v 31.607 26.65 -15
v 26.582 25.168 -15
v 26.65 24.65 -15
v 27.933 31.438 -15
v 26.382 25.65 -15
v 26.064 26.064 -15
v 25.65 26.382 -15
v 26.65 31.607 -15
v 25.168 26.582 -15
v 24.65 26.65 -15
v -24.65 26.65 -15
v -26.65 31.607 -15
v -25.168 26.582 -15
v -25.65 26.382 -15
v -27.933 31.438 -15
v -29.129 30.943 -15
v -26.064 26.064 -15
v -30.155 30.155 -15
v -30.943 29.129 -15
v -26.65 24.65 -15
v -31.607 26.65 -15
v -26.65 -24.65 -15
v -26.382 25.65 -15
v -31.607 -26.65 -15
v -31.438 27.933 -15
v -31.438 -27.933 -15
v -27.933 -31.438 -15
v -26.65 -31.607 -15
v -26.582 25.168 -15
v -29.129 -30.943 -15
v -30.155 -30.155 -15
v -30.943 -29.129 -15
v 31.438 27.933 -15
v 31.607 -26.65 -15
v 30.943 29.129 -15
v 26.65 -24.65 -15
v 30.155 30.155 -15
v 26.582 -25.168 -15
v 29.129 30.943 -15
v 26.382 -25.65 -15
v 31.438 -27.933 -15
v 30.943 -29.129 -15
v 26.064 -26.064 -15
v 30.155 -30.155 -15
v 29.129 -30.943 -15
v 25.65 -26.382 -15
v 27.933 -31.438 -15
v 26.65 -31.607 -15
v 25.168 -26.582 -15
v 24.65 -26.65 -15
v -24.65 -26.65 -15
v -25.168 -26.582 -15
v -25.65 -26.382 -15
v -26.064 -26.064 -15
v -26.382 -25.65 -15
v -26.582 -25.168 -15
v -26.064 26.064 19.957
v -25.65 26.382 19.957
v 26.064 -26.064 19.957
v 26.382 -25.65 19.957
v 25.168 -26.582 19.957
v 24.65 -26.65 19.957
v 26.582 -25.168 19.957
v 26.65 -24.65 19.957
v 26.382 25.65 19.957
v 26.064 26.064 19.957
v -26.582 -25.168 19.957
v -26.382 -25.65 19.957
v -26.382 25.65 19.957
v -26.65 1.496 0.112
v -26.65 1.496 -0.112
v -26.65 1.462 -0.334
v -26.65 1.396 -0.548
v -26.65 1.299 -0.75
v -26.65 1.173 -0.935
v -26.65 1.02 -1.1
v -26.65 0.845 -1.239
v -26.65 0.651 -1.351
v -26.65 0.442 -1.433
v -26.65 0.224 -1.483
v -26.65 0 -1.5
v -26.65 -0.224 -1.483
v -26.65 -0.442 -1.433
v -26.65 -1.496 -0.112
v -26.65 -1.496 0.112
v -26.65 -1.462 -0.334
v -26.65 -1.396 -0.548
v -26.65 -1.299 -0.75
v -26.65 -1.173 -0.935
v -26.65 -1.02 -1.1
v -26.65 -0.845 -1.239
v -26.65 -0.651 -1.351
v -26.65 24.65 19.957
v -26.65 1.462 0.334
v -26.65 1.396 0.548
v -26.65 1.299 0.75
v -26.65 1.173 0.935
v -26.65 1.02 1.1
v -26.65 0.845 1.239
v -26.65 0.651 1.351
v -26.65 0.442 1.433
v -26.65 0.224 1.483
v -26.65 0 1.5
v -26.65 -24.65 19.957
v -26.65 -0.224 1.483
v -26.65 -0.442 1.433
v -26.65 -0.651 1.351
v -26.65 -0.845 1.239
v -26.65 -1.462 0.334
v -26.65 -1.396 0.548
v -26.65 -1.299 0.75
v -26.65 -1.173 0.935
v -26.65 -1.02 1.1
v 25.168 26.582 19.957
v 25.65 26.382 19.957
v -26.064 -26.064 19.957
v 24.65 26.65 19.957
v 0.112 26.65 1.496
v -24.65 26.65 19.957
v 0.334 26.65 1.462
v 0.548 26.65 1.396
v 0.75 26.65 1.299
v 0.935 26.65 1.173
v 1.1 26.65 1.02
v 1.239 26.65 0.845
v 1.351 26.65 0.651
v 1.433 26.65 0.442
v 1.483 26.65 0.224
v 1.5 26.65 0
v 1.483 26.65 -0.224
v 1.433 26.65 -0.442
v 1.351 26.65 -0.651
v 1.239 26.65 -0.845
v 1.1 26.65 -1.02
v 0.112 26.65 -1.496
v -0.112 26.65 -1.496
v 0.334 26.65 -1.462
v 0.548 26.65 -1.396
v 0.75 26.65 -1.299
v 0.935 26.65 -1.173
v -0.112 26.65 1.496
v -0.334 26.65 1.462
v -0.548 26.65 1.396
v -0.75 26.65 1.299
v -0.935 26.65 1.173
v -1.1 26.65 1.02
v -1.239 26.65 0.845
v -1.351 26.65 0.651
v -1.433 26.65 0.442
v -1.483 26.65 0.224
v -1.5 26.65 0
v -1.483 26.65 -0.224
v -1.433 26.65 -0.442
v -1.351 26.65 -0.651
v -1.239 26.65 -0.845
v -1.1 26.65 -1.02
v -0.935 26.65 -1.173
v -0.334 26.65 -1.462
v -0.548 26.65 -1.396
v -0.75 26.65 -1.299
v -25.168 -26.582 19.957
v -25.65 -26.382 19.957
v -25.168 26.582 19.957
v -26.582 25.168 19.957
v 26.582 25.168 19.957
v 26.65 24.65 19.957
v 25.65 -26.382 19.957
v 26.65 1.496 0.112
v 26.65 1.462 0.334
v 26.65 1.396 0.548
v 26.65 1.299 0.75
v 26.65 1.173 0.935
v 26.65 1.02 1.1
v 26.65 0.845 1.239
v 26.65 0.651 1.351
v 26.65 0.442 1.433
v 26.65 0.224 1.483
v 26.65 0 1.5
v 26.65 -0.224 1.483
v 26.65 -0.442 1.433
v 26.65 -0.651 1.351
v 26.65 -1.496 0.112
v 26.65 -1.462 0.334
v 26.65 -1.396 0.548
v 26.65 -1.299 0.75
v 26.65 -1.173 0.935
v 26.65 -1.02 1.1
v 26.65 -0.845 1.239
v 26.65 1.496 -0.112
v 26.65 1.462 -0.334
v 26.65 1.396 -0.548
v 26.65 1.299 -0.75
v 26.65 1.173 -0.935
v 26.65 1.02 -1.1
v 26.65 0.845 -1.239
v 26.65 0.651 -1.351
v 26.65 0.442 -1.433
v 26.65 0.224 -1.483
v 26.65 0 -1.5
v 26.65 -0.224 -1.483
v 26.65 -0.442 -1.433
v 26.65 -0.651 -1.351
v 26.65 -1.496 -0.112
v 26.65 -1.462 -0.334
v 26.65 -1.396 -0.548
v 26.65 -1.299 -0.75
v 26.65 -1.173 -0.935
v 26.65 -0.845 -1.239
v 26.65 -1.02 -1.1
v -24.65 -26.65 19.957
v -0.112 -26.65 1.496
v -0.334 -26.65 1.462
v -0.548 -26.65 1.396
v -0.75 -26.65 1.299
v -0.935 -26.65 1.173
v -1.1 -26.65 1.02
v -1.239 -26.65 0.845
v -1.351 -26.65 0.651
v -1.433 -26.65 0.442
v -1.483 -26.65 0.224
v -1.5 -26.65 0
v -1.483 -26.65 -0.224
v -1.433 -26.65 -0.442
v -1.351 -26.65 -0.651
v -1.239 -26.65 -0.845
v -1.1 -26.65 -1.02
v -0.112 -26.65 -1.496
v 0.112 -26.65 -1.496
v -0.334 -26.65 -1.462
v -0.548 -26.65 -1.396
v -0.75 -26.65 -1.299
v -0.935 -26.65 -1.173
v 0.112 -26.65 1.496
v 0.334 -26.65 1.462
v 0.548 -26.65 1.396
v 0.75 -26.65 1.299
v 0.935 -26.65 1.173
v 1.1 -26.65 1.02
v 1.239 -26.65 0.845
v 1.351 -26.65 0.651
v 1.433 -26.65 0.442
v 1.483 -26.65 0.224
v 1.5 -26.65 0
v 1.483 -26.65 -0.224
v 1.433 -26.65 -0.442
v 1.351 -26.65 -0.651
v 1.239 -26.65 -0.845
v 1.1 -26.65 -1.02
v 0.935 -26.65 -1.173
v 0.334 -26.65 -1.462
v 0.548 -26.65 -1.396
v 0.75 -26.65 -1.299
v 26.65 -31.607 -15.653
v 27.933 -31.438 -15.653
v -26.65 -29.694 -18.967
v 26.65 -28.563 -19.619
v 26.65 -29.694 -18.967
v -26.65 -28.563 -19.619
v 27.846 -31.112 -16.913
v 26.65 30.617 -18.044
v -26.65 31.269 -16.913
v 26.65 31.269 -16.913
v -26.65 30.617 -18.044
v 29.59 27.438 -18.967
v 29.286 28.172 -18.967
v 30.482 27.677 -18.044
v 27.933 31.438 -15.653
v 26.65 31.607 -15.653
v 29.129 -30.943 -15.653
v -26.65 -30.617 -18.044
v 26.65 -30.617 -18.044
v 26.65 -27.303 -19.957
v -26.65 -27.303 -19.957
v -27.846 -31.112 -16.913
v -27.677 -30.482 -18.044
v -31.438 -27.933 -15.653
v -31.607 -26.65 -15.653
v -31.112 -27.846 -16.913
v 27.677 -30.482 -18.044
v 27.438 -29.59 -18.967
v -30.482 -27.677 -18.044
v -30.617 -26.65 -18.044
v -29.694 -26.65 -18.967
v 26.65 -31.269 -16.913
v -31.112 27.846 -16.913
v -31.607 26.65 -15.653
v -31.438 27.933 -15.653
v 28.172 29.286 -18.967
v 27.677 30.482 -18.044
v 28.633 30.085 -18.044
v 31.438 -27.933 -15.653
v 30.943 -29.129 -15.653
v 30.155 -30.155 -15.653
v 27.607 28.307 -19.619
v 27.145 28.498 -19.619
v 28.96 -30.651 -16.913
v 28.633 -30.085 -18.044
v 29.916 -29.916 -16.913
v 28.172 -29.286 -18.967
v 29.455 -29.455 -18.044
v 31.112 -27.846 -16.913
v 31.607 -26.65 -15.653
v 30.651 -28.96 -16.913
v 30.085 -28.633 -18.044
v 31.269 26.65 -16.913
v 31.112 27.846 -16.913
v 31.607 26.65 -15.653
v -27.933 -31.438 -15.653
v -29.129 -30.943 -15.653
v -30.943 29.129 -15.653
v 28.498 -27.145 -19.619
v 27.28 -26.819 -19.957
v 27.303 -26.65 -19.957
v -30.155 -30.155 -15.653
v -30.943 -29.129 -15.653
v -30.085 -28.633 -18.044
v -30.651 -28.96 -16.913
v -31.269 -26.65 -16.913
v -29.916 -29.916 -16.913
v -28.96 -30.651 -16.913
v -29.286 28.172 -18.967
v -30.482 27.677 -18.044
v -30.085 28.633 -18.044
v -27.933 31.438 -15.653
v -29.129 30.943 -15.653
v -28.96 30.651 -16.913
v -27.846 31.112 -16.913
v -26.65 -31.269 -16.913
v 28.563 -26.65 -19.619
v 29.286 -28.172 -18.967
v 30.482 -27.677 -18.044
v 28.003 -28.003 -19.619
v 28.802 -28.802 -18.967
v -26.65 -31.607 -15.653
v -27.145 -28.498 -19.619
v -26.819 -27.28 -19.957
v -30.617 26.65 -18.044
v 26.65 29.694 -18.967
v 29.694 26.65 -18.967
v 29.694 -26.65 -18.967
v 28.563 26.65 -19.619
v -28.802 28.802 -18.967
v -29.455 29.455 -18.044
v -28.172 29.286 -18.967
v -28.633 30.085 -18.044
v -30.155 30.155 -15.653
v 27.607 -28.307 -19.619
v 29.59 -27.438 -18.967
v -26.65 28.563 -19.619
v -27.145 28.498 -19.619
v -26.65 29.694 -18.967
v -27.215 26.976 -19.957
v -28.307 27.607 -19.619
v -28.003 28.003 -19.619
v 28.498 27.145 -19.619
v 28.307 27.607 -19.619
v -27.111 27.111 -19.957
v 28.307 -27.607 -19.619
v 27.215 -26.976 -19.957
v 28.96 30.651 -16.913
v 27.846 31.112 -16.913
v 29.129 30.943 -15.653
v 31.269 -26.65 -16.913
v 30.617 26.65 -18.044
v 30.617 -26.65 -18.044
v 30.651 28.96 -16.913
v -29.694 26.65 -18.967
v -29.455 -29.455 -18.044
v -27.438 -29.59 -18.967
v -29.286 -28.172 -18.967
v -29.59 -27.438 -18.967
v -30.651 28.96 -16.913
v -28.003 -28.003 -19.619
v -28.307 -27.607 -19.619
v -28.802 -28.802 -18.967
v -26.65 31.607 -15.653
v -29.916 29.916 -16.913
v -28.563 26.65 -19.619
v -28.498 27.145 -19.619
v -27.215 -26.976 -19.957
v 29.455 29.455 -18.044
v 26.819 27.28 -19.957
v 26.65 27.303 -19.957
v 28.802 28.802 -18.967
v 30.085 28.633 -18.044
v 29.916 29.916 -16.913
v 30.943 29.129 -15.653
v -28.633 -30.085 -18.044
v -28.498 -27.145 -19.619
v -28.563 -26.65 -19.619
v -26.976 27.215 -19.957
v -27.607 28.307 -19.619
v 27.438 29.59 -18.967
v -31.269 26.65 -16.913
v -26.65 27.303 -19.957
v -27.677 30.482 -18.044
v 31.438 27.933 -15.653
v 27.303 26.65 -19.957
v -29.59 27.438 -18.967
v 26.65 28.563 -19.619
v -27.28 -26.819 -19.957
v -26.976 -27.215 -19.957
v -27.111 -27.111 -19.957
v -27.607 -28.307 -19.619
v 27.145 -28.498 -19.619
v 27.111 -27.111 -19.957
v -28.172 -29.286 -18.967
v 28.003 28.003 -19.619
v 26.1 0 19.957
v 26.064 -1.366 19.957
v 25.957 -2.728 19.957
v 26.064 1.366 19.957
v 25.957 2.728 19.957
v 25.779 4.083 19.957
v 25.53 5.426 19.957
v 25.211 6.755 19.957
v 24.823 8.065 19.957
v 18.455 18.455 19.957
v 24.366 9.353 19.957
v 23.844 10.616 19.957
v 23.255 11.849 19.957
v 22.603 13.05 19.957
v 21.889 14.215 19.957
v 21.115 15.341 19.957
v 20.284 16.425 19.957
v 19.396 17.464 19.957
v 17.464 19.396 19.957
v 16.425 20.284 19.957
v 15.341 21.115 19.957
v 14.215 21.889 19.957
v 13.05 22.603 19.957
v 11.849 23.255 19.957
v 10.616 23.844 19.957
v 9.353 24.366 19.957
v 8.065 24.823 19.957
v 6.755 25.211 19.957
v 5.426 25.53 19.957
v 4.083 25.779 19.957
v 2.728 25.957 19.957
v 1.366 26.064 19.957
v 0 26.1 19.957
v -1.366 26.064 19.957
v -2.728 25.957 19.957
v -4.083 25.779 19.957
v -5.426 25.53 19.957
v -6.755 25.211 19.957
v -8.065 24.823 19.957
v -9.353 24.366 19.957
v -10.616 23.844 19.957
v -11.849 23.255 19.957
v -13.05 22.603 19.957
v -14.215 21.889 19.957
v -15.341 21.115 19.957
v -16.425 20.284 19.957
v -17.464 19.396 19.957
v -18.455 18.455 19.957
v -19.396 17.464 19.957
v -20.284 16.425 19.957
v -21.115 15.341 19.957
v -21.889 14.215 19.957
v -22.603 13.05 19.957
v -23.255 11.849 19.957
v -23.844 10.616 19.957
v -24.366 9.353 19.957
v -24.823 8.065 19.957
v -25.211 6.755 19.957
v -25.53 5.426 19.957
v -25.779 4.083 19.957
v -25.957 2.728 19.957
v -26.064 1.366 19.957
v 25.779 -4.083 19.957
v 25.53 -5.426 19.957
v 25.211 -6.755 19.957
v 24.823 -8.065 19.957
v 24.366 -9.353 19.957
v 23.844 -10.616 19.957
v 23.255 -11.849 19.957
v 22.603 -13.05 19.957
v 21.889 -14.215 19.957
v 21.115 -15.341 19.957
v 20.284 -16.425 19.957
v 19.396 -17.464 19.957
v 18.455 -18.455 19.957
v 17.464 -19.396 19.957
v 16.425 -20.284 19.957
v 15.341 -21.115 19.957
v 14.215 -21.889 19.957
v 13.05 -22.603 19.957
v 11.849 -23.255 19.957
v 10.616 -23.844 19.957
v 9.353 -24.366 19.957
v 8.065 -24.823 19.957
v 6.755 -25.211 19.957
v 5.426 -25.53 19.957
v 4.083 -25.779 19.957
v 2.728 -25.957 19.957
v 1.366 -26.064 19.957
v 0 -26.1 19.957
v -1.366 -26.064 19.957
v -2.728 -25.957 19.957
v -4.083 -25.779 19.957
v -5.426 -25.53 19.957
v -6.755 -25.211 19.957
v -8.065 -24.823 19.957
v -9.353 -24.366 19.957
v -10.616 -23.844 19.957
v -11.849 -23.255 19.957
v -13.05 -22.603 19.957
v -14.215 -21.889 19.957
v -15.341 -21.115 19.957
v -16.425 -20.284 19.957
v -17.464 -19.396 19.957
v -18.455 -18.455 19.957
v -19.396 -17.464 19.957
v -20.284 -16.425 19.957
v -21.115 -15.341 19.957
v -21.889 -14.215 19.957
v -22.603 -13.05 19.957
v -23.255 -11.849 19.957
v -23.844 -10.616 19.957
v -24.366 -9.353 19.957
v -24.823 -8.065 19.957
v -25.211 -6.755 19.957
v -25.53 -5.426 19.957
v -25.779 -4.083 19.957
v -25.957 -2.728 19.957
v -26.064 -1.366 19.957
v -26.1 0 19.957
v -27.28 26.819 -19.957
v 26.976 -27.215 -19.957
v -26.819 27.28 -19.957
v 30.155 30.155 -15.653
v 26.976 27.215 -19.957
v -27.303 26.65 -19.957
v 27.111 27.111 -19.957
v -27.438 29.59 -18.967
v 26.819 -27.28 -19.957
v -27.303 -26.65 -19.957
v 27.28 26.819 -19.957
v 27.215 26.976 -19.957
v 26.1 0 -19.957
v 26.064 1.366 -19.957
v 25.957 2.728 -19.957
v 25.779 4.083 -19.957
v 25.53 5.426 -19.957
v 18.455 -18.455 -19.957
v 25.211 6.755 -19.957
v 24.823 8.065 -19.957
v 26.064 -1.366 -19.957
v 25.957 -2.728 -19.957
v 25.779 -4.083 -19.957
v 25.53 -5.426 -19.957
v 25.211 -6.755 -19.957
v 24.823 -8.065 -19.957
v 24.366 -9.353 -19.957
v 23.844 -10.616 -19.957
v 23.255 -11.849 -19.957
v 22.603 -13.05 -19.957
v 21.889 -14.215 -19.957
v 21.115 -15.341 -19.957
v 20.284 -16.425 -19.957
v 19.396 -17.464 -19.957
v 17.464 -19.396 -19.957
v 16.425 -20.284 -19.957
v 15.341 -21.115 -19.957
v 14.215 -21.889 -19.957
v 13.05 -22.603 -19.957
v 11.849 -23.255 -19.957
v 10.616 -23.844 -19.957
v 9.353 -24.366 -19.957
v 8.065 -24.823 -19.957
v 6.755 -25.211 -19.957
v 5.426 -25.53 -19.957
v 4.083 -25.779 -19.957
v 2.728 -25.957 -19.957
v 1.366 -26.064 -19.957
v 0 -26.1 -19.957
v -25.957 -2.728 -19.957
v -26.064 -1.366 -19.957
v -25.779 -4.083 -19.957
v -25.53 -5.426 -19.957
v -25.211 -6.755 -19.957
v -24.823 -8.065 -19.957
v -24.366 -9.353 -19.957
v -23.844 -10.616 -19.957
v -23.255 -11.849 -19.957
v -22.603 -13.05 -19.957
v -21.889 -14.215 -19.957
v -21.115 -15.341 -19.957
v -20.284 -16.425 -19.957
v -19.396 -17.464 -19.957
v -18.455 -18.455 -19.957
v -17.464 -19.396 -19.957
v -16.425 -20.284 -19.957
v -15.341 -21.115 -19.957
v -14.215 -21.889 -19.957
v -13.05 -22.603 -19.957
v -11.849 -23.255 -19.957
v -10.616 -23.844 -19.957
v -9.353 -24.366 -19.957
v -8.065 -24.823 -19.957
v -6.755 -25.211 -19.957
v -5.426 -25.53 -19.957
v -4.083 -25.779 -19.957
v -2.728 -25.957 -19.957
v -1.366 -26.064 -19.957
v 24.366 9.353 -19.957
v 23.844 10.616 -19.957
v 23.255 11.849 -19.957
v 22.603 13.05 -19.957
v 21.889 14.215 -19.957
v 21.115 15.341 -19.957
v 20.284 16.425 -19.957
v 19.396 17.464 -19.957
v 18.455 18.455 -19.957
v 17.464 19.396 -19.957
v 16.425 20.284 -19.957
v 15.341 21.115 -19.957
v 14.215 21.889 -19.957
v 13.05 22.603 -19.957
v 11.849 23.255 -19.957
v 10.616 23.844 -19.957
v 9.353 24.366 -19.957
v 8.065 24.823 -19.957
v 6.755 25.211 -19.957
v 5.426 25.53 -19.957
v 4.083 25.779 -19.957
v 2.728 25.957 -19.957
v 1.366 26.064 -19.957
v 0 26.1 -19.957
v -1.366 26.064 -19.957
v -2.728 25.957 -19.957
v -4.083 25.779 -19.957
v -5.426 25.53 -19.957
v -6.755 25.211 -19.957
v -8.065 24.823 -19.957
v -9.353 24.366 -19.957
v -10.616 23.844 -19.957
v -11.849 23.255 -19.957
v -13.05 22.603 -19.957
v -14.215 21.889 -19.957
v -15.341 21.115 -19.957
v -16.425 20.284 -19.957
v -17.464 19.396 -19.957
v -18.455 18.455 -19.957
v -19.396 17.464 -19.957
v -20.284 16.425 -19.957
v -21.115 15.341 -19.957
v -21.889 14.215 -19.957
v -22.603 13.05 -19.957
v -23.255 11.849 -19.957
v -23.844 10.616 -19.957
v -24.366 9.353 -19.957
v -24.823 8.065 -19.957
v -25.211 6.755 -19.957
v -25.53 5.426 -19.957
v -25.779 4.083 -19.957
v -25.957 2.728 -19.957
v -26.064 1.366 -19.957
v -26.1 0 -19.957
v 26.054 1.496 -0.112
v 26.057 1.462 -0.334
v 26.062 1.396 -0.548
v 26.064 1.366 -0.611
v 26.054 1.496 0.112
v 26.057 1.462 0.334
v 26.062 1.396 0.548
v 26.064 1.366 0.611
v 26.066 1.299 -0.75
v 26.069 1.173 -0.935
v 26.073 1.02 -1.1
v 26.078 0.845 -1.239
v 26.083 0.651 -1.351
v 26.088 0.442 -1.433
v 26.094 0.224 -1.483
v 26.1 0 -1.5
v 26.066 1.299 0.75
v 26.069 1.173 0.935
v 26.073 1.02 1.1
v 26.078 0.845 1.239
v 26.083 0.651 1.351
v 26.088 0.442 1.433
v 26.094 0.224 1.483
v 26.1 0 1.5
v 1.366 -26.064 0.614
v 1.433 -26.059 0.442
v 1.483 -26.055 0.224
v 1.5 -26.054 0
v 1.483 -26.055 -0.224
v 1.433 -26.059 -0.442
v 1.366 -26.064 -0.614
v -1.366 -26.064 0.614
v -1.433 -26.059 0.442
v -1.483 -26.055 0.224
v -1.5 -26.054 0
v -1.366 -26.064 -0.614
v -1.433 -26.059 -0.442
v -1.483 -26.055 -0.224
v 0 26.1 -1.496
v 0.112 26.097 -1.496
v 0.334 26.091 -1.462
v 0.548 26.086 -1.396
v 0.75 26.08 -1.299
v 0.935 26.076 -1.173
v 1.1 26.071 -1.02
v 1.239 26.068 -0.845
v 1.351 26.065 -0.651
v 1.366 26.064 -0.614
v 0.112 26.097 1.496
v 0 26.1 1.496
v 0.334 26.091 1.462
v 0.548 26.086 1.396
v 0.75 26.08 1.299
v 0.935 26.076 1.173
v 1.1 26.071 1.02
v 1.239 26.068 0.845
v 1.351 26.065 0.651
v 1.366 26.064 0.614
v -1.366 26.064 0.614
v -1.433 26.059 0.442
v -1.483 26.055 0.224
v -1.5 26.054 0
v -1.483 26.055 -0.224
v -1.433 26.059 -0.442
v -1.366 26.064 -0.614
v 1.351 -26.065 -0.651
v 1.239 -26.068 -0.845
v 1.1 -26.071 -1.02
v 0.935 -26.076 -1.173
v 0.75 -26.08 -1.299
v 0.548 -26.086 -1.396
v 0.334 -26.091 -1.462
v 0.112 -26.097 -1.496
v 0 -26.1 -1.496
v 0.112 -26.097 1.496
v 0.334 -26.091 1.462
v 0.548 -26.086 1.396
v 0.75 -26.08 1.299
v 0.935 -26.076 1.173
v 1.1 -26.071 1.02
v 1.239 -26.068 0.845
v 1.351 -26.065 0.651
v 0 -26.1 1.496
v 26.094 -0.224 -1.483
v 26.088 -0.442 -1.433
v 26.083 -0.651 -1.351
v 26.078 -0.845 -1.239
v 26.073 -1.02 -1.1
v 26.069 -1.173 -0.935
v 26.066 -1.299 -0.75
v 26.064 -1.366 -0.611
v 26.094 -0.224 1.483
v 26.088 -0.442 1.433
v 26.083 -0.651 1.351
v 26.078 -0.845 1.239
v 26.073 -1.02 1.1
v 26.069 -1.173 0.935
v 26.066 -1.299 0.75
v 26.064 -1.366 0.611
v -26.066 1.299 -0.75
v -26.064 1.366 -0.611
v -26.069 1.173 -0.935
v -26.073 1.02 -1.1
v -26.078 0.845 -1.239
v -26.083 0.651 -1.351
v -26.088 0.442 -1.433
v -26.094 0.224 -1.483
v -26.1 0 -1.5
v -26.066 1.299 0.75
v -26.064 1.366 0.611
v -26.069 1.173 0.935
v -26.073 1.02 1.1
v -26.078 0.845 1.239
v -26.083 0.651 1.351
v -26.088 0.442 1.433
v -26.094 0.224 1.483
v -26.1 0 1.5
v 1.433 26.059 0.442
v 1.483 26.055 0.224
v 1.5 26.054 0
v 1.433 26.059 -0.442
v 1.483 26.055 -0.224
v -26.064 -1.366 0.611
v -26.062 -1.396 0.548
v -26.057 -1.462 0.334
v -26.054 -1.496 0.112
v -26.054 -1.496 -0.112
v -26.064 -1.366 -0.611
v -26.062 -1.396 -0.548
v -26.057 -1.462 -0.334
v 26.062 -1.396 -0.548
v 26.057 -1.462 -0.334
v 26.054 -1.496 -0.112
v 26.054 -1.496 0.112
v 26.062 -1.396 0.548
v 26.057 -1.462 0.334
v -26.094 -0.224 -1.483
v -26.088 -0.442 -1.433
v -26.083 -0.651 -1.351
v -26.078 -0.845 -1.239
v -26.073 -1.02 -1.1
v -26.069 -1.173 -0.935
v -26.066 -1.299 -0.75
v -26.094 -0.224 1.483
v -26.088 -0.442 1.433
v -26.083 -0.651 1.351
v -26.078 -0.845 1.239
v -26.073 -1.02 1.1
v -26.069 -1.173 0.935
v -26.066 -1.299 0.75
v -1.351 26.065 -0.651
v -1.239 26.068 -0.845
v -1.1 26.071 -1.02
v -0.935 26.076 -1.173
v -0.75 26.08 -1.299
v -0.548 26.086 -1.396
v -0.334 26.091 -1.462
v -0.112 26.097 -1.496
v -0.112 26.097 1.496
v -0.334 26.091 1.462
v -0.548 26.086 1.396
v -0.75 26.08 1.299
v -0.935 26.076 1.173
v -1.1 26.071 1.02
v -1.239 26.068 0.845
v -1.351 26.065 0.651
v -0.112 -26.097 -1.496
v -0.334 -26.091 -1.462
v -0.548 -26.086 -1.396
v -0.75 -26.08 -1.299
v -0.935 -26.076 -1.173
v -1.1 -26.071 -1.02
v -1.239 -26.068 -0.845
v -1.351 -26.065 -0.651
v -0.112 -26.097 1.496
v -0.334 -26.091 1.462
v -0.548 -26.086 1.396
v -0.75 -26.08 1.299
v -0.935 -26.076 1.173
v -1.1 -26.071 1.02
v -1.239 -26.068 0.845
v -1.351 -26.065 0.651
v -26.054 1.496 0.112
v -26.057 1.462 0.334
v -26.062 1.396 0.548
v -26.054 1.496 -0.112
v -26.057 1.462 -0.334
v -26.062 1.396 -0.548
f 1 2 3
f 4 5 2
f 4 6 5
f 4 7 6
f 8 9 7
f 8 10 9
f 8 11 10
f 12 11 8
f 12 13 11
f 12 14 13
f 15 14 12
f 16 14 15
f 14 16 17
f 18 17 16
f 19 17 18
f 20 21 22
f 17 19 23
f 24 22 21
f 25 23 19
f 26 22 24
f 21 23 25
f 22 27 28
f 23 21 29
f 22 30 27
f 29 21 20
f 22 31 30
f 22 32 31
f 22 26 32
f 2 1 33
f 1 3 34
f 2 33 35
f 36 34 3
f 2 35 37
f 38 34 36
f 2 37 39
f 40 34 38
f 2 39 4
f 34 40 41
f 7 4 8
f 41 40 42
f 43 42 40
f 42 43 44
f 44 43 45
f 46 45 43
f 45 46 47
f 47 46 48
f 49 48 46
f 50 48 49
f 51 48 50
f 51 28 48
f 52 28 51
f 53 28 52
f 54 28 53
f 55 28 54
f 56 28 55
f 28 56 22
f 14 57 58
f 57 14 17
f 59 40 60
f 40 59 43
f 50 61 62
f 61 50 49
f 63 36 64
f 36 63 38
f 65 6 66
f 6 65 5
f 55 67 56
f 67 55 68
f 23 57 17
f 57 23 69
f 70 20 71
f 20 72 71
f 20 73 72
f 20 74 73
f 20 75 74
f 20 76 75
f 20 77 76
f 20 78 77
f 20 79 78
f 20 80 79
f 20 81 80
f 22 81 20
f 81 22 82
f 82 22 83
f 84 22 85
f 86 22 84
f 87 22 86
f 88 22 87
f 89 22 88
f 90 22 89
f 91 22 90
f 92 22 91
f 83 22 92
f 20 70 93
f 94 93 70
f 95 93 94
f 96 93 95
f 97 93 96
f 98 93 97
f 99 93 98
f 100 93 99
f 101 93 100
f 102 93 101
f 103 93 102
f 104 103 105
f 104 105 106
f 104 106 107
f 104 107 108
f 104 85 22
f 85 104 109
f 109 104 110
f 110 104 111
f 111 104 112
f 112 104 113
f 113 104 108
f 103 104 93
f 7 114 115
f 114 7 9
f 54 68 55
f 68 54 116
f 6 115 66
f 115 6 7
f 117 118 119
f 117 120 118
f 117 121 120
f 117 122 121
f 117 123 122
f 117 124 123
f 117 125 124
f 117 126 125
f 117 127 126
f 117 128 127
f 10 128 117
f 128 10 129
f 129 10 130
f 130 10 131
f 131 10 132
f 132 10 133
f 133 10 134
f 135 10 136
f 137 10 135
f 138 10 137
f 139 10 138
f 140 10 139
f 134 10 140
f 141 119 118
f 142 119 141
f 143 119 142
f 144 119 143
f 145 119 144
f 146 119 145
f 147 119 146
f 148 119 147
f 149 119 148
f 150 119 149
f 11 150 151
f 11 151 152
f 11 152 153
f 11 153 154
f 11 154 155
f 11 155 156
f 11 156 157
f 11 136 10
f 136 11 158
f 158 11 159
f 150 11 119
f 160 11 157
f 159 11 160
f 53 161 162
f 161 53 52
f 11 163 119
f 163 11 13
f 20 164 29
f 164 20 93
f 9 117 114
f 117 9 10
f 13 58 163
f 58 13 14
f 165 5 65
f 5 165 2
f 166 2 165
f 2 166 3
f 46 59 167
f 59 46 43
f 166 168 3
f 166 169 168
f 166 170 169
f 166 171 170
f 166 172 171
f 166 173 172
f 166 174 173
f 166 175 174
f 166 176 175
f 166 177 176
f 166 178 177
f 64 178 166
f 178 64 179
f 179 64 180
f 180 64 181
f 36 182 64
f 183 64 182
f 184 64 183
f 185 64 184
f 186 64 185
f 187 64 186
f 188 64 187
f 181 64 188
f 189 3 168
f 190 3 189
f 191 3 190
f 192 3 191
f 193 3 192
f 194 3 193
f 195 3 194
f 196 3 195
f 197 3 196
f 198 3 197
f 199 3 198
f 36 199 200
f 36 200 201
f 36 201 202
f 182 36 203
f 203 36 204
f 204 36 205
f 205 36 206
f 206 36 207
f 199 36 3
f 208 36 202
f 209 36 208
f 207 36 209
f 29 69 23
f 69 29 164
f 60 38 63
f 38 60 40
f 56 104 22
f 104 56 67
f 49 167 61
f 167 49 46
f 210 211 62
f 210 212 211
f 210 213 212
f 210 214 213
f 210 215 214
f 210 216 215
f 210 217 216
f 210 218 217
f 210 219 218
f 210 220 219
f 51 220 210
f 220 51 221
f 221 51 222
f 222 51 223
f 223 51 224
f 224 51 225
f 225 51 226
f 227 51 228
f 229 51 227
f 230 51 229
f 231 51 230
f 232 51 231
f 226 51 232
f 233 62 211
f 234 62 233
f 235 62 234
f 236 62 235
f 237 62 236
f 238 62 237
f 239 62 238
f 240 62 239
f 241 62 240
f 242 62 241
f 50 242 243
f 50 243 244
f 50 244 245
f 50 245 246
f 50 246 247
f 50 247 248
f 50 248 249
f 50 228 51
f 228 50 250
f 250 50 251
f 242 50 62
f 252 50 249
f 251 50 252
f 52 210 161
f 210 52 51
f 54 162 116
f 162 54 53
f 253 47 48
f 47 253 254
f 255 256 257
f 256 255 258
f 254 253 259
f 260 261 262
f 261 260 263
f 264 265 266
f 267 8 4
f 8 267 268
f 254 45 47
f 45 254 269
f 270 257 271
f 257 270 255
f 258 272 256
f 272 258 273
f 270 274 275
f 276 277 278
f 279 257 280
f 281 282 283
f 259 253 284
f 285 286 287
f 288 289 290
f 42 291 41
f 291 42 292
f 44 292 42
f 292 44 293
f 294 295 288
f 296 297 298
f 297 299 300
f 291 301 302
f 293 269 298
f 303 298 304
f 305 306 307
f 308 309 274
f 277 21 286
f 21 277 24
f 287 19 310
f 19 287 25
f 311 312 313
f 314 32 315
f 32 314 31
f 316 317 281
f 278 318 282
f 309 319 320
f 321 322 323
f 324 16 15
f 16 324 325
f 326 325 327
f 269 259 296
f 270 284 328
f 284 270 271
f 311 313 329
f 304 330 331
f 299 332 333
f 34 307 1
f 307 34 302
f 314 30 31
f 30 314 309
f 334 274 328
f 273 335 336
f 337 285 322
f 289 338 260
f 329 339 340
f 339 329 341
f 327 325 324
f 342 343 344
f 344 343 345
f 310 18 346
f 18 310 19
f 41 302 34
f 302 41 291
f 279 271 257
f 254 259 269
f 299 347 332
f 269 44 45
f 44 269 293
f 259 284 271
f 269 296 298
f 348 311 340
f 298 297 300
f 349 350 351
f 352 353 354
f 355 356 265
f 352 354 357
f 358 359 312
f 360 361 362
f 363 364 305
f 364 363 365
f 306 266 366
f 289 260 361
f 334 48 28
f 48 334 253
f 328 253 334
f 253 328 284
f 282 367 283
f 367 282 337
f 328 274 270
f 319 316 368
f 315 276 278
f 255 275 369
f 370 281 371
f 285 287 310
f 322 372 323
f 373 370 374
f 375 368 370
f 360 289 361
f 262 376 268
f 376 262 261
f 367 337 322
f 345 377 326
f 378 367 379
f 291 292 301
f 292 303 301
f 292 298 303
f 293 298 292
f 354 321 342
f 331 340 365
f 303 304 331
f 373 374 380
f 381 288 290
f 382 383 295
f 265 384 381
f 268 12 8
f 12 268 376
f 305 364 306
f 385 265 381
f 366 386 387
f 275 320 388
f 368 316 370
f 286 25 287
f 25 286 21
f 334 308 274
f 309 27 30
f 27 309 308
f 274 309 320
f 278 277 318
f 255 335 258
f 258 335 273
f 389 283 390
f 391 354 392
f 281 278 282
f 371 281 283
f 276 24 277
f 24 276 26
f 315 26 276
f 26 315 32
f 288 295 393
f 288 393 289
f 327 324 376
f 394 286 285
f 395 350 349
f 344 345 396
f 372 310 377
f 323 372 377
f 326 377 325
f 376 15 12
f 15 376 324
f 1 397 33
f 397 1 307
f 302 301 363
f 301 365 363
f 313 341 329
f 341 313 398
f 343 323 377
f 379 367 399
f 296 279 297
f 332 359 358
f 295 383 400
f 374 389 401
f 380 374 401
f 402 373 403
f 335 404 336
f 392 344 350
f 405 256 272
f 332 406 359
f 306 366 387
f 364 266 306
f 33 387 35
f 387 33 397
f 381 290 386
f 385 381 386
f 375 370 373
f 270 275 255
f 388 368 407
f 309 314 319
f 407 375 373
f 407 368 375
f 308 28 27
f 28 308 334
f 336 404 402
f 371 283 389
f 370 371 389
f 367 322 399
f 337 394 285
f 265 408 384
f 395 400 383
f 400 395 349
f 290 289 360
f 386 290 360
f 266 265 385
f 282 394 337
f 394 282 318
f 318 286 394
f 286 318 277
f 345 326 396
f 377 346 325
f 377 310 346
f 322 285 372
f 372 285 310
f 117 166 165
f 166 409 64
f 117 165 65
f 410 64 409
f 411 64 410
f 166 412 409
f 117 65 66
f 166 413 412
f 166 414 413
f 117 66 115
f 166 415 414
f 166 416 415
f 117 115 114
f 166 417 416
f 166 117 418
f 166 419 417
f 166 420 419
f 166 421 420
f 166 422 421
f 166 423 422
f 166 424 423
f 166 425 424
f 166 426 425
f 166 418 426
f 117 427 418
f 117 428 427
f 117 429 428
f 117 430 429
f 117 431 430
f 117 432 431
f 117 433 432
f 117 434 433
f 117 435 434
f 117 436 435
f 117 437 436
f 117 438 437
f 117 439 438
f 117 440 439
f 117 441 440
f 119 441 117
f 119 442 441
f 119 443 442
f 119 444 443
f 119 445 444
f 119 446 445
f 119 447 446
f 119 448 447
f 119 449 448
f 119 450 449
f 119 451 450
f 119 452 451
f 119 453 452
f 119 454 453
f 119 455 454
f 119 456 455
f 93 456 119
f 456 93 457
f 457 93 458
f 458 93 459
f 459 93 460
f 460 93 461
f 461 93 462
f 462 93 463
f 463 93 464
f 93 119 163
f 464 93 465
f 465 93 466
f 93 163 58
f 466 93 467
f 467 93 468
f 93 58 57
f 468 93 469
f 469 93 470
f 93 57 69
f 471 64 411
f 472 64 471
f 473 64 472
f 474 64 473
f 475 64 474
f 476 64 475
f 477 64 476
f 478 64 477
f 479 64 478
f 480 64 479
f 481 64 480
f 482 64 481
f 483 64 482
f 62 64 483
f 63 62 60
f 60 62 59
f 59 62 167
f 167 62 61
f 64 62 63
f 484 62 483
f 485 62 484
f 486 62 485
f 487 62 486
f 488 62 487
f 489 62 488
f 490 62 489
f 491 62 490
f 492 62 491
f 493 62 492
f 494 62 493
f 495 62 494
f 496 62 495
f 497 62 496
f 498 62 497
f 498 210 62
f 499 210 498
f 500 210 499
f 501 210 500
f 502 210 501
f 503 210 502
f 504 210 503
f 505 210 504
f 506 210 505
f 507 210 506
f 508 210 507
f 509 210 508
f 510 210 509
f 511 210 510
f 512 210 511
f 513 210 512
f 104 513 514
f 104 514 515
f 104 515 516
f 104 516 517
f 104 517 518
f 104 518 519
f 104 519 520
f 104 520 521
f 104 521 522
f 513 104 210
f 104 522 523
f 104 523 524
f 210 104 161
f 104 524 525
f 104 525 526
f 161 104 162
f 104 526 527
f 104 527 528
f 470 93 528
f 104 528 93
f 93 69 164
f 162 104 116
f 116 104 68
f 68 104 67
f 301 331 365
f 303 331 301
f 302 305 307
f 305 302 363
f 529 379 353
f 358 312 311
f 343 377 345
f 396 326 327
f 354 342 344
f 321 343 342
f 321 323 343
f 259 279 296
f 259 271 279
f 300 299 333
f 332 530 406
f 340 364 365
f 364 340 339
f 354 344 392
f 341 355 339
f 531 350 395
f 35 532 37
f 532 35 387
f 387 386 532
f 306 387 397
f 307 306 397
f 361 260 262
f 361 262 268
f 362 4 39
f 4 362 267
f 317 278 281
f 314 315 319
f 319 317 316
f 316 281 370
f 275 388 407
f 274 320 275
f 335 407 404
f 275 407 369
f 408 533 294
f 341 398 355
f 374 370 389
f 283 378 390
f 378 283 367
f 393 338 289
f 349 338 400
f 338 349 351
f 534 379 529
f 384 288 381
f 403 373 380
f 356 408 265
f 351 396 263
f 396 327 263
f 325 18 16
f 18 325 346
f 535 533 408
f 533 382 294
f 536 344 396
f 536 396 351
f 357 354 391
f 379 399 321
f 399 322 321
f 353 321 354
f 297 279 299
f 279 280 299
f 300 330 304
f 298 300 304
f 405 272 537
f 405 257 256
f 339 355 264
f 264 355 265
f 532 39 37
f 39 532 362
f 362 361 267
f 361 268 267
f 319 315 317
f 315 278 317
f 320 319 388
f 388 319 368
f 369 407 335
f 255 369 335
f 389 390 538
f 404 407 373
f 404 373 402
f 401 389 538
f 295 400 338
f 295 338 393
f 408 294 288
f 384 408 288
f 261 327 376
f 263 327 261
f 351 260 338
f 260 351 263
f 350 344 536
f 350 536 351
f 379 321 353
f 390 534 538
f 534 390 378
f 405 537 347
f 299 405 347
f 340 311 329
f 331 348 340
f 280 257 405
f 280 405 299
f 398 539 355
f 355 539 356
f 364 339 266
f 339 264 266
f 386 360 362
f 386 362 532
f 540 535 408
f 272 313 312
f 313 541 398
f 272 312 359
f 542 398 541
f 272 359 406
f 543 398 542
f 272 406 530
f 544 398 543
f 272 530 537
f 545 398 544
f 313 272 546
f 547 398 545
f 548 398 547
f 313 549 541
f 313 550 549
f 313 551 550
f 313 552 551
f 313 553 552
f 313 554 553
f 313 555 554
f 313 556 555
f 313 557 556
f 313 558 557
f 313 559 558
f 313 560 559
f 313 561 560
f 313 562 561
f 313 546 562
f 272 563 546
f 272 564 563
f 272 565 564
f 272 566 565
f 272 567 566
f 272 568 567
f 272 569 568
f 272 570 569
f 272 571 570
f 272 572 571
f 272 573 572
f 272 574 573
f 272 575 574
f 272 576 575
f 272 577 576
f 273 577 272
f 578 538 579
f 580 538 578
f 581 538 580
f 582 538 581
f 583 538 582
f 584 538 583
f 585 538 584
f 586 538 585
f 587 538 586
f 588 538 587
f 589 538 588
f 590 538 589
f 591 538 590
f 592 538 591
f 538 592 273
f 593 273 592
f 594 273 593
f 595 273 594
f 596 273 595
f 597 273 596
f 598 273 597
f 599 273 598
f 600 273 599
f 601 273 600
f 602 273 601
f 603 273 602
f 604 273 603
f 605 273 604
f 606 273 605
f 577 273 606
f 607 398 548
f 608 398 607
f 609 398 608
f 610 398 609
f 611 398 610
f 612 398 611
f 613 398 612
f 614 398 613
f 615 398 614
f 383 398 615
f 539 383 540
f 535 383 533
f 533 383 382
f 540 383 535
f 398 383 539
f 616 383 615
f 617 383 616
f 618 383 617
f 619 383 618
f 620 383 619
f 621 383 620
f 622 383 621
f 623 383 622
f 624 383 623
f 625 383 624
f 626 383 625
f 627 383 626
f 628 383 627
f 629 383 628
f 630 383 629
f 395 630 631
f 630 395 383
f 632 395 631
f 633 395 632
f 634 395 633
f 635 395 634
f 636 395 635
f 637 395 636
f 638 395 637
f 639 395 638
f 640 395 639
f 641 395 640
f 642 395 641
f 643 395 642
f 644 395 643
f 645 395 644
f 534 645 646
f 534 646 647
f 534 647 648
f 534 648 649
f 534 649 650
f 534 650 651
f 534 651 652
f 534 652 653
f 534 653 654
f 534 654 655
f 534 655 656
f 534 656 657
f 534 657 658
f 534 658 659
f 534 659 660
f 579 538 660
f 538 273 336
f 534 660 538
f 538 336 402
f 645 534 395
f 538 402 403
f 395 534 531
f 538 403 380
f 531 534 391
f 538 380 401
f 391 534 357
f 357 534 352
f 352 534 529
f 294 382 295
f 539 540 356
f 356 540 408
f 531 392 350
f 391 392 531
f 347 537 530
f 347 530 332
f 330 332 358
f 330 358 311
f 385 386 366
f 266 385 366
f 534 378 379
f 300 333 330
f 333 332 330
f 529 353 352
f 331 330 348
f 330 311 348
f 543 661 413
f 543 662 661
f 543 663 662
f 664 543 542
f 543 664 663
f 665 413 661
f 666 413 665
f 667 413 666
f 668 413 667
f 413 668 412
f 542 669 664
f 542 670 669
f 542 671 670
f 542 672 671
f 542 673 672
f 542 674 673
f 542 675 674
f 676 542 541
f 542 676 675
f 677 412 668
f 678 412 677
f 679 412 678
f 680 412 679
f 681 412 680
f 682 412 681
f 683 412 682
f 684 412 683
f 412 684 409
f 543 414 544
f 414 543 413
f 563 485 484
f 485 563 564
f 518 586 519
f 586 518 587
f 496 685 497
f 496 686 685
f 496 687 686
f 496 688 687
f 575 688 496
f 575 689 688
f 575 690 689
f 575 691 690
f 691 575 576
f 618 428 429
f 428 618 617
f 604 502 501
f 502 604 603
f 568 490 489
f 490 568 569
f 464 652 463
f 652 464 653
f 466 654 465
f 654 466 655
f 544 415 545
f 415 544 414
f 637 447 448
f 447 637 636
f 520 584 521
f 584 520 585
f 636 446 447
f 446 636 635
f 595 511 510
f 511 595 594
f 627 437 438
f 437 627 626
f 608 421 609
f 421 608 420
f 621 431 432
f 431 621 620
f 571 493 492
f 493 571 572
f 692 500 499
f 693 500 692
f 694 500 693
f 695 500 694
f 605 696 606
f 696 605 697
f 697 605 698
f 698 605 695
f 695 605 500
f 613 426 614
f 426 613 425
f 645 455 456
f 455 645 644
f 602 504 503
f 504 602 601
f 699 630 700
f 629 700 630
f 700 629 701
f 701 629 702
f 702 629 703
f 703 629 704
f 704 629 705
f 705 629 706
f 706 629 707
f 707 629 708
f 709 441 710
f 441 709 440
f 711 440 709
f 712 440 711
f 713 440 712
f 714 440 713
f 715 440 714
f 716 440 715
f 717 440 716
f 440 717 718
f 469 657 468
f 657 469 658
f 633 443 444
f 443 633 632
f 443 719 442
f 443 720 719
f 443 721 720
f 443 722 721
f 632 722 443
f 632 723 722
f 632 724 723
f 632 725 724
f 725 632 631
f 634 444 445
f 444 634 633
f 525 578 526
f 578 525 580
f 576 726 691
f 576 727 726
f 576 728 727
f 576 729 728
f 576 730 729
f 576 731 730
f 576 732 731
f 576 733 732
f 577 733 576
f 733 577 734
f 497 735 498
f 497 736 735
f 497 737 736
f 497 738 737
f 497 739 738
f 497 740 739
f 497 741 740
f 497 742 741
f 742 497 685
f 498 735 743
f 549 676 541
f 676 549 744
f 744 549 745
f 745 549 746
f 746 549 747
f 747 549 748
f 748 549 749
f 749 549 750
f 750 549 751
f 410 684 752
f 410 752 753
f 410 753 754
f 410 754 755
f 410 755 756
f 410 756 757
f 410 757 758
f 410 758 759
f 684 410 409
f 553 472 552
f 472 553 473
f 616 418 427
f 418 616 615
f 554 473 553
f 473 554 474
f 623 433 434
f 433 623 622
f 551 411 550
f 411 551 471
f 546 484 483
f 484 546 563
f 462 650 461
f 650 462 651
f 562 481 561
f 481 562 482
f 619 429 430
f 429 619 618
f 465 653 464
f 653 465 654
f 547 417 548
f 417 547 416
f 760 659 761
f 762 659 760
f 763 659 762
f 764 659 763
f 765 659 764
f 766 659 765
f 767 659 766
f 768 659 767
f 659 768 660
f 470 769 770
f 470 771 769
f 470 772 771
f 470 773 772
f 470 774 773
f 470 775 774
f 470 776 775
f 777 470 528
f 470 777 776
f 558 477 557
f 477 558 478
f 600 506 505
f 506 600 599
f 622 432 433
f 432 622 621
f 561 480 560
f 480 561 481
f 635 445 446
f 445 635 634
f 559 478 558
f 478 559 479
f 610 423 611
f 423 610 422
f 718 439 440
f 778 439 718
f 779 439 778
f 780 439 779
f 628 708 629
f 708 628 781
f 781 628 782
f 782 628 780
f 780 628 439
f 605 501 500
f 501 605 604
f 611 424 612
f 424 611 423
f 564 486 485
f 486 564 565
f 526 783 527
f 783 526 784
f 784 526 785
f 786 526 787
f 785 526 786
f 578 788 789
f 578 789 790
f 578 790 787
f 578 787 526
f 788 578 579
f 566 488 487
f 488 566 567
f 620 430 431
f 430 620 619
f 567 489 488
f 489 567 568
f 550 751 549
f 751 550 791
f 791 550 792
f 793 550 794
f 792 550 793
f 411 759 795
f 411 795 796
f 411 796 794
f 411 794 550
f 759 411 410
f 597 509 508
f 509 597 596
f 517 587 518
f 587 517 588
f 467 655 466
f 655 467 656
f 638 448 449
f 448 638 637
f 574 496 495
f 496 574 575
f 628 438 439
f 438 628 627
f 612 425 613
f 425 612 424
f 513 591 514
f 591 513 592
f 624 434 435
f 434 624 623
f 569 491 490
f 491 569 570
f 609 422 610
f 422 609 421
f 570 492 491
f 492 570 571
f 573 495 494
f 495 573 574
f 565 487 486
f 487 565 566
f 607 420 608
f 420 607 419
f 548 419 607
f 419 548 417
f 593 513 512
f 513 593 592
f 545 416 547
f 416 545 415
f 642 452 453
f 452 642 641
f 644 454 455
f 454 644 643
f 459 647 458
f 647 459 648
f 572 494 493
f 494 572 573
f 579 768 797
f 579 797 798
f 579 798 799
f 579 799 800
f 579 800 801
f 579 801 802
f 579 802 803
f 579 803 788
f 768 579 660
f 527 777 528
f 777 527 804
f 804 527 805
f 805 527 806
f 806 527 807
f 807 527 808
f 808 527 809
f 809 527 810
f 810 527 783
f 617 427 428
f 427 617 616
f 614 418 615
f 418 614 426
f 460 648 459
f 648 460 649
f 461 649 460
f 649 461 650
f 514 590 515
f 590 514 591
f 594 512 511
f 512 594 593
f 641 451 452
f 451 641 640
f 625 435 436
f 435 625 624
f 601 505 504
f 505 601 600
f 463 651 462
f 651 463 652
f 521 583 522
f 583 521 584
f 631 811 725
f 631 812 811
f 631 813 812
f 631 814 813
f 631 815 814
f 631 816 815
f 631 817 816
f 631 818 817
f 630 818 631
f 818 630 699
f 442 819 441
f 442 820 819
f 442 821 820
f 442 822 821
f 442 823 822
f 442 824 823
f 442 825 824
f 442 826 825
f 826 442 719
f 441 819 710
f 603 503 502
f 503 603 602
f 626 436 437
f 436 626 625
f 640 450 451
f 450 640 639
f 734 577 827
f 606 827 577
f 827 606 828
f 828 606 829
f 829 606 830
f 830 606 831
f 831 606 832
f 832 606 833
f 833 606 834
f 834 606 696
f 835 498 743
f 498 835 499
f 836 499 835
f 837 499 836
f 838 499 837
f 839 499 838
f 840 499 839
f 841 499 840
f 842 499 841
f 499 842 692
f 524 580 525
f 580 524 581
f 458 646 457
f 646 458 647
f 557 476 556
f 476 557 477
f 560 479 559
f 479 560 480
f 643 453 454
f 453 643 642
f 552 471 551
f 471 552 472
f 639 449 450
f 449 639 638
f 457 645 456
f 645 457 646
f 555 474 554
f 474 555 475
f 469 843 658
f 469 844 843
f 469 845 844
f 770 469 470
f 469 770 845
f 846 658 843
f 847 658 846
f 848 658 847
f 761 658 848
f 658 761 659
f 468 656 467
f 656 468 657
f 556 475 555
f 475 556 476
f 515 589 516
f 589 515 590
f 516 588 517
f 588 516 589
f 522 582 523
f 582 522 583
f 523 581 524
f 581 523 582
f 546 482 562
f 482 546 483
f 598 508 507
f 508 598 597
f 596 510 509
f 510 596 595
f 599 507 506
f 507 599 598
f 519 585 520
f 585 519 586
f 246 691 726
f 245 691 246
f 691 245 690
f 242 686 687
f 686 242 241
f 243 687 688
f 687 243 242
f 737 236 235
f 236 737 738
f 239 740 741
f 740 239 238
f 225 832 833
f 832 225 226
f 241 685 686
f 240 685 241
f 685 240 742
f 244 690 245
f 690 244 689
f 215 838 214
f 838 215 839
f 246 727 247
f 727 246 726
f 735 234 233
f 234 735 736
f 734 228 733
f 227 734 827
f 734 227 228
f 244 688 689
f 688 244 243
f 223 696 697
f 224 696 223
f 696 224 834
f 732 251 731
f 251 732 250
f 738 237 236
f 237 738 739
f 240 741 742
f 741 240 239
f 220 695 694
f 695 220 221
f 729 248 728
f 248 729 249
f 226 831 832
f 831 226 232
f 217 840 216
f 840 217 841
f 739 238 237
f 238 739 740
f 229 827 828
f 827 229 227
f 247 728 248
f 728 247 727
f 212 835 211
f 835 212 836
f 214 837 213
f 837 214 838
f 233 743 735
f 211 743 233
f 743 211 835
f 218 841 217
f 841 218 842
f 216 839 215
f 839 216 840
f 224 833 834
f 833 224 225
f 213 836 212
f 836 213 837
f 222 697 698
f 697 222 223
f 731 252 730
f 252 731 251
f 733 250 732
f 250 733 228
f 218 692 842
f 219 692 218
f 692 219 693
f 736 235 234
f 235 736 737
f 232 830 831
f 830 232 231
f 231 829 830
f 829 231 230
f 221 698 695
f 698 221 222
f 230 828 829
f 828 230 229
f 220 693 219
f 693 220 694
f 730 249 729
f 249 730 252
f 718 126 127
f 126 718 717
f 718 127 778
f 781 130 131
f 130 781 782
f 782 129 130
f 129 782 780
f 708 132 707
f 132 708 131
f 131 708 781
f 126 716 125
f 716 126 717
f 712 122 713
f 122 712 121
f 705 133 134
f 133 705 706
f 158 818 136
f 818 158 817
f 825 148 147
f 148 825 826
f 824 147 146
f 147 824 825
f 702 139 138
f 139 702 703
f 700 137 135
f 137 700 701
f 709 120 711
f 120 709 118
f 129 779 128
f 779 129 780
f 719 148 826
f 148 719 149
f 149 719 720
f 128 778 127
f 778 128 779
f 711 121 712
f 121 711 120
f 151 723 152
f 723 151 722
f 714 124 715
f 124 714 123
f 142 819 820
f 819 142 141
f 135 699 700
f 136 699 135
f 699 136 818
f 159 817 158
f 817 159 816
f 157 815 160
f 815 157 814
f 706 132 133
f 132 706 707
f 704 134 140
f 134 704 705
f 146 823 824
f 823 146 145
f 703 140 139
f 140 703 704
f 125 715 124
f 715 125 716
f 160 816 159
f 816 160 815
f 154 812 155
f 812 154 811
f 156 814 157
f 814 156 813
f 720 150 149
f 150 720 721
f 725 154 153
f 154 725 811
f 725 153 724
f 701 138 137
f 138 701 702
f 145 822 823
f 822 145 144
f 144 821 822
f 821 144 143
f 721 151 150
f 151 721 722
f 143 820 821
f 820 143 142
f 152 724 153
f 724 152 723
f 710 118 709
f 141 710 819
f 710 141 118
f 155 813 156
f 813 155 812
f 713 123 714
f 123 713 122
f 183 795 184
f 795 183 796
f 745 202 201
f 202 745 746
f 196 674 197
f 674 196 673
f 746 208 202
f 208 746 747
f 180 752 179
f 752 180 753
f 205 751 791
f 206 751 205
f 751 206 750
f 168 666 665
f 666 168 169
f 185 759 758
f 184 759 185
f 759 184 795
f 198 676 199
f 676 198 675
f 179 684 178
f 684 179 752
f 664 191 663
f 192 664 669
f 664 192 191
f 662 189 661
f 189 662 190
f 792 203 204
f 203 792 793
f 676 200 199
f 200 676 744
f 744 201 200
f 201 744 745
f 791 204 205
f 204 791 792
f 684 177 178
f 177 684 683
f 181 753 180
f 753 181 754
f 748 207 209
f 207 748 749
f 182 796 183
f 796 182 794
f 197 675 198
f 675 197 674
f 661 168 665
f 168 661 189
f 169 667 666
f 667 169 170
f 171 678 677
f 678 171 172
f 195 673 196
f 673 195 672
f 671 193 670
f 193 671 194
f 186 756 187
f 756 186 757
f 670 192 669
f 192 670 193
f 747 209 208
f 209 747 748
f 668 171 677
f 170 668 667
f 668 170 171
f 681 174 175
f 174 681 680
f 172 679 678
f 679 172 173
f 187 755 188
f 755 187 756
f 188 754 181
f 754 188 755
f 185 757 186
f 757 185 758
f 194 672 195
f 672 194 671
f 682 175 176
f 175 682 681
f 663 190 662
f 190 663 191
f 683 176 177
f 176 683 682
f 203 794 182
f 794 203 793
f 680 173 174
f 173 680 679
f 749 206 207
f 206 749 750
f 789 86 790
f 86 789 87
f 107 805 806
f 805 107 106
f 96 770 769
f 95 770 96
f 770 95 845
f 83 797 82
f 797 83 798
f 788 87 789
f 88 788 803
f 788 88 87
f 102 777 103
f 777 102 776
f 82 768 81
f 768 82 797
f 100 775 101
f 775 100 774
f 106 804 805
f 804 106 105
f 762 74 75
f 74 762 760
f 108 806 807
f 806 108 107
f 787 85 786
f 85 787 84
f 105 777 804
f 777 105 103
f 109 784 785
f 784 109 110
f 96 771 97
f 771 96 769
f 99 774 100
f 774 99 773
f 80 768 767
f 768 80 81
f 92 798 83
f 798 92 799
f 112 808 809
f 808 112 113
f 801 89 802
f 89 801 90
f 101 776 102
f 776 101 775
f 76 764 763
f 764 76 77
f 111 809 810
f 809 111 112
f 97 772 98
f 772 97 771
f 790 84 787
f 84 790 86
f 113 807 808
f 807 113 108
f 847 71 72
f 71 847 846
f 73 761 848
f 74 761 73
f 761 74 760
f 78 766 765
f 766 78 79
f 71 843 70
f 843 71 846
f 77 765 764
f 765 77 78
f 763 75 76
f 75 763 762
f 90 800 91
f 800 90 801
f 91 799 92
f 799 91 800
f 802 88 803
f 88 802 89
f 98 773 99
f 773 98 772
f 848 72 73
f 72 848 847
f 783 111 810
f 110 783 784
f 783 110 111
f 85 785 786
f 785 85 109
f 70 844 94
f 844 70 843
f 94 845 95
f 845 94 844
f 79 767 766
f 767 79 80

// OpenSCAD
// file: clamp.scad
// Generic clamp for the projector stand

// Copyright (C) 2020 Jeremy Bennett <jeremy@jeremybennett.com>

// Contributor Jeremy Bennett <jeremy@jeremybennett.com>

// SPDX-License-Identifier: CC-BY-SA-4.0

// This fits inside the square to ensure a snug fit on the alumnium tube. This
// is the generic design, with variants for the upper and lower clamp.

// Useful constants
EPS = 0.1;			// Small distance
TUBE_R = 52.2 / 2.0;		// Radius of alumninium tube measured 51.6
SQUARE_L = 53.3;		// Dimensions of the square
SQUARE_W = 53.3;
SQUARE_H = 30.0;
OUTER_ROUND_R = 5.0;		// Curvature of outer edge
INNER_ROUND_R = 2.0;		// Curvature of inner corners
BOLT_OFF = SQUARE_W / 2.0 - 10.0;
HEAD_R = 8.6 / 2.0;		// Screw head face-to-face (nominal 8.0 diameter)
GRUB_R = 3.0 / 2.0;		// Space for grub screw tip

// The basic block with rounded edges from which we cut out everything else.
module big_block () {
     minkowski () {
	  cube (size = [SQUARE_L, SQUARE_W, SQUARE_H], center = true);
	  sphere (r = OUTER_ROUND_R, $fn = 24);
     }
}

// The inner block with rounded corners used to trim the big block
module hollow_block () {
     difference () {
	  translate (v = [0, 0, SQUARE_H / 2])
	       cube (size = [SQUARE_L * 2, SQUARE_W * 2, SQUARE_H * 2],
		     center = true);
	  minkowski () {
	       cube (size = [SQUARE_L - INNER_ROUND_R * 2,
			     SQUARE_W - INNER_ROUND_R * 2, SQUARE_H],
		     center = true);
	       cylinder (h = SQUARE_H, r = INNER_ROUND_R, center = true,
			 $fn = 24);
	  }
     }
}

// Cut out the edges and the central hole
module raw_clamp () {
     difference () {
	  big_block ();
	  hollow_block ();
	  cylinder (r = TUBE_R, h = SQUARE_H + OUTER_ROUND_R * 2, center = true,
		    $fn = 120);
     }
}

// The hole in which the nut will fit.
module nut_hole () {
     rotate (a = [90, 0, 0])
	  cylinder (r = HEAD_R, h = SQUARE_W + EPS, $fn = 6, center = true);
}

// The module for the clamp can be generated without the nut holes.
module clamp (make_holes) {
     difference () {
	  raw_clamp ();
	  // Optional Nut holes
	  if (make_holes) {
	       translate (v = [-BOLT_OFF, -SQUARE_W / 2.0, 0])
		    nut_hole ();
	       translate (v = [BOLT_OFF, SQUARE_W / 2.0, 0])
		    nut_hole ();
	       translate (v = [-SQUARE_W / 2.0, BOLT_OFF, 0])
		    rotate (a = [0, 0, -90])
		         nut_hole ();
	       translate (v = [SQUARE_W / 2.0, -BOLT_OFF, 0])
		    rotate (a = [0, 0, -90])
		         nut_hole ();
	  }
	  // Grub screw holes
	  rotate (a = [90, 0, 0])
	       cylinder (r = GRUB_R, h = SQUARE_W, $fn = 42);
	  rotate (a = [-90, 0, 0])
	       cylinder (r = GRUB_R, h = SQUARE_W, $fn = 42);
	  rotate (a = [0, 90, 0])
	       cylinder (r = GRUB_R, h = SQUARE_L, $fn = 42);
	  rotate (a = [0, -90, 0])
	       cylinder (r = GRUB_R, h = SQUARE_L, $fn = 42);
     }
}
// main file
// Upper clamp for the projector stand

// Copyright (C) 2020 Jeremy Bennett <jeremy@jeremybennett.com>

// Contributor Jeremy Bennett <jeremy@jeremybennett.com>

// SPDX-License-Identifier: CC-BY-SA-4.0

// The upper clamp has no bolt head holes
include <clamp.scad>

// Generate a clamp without nut holes
clamp (false);
